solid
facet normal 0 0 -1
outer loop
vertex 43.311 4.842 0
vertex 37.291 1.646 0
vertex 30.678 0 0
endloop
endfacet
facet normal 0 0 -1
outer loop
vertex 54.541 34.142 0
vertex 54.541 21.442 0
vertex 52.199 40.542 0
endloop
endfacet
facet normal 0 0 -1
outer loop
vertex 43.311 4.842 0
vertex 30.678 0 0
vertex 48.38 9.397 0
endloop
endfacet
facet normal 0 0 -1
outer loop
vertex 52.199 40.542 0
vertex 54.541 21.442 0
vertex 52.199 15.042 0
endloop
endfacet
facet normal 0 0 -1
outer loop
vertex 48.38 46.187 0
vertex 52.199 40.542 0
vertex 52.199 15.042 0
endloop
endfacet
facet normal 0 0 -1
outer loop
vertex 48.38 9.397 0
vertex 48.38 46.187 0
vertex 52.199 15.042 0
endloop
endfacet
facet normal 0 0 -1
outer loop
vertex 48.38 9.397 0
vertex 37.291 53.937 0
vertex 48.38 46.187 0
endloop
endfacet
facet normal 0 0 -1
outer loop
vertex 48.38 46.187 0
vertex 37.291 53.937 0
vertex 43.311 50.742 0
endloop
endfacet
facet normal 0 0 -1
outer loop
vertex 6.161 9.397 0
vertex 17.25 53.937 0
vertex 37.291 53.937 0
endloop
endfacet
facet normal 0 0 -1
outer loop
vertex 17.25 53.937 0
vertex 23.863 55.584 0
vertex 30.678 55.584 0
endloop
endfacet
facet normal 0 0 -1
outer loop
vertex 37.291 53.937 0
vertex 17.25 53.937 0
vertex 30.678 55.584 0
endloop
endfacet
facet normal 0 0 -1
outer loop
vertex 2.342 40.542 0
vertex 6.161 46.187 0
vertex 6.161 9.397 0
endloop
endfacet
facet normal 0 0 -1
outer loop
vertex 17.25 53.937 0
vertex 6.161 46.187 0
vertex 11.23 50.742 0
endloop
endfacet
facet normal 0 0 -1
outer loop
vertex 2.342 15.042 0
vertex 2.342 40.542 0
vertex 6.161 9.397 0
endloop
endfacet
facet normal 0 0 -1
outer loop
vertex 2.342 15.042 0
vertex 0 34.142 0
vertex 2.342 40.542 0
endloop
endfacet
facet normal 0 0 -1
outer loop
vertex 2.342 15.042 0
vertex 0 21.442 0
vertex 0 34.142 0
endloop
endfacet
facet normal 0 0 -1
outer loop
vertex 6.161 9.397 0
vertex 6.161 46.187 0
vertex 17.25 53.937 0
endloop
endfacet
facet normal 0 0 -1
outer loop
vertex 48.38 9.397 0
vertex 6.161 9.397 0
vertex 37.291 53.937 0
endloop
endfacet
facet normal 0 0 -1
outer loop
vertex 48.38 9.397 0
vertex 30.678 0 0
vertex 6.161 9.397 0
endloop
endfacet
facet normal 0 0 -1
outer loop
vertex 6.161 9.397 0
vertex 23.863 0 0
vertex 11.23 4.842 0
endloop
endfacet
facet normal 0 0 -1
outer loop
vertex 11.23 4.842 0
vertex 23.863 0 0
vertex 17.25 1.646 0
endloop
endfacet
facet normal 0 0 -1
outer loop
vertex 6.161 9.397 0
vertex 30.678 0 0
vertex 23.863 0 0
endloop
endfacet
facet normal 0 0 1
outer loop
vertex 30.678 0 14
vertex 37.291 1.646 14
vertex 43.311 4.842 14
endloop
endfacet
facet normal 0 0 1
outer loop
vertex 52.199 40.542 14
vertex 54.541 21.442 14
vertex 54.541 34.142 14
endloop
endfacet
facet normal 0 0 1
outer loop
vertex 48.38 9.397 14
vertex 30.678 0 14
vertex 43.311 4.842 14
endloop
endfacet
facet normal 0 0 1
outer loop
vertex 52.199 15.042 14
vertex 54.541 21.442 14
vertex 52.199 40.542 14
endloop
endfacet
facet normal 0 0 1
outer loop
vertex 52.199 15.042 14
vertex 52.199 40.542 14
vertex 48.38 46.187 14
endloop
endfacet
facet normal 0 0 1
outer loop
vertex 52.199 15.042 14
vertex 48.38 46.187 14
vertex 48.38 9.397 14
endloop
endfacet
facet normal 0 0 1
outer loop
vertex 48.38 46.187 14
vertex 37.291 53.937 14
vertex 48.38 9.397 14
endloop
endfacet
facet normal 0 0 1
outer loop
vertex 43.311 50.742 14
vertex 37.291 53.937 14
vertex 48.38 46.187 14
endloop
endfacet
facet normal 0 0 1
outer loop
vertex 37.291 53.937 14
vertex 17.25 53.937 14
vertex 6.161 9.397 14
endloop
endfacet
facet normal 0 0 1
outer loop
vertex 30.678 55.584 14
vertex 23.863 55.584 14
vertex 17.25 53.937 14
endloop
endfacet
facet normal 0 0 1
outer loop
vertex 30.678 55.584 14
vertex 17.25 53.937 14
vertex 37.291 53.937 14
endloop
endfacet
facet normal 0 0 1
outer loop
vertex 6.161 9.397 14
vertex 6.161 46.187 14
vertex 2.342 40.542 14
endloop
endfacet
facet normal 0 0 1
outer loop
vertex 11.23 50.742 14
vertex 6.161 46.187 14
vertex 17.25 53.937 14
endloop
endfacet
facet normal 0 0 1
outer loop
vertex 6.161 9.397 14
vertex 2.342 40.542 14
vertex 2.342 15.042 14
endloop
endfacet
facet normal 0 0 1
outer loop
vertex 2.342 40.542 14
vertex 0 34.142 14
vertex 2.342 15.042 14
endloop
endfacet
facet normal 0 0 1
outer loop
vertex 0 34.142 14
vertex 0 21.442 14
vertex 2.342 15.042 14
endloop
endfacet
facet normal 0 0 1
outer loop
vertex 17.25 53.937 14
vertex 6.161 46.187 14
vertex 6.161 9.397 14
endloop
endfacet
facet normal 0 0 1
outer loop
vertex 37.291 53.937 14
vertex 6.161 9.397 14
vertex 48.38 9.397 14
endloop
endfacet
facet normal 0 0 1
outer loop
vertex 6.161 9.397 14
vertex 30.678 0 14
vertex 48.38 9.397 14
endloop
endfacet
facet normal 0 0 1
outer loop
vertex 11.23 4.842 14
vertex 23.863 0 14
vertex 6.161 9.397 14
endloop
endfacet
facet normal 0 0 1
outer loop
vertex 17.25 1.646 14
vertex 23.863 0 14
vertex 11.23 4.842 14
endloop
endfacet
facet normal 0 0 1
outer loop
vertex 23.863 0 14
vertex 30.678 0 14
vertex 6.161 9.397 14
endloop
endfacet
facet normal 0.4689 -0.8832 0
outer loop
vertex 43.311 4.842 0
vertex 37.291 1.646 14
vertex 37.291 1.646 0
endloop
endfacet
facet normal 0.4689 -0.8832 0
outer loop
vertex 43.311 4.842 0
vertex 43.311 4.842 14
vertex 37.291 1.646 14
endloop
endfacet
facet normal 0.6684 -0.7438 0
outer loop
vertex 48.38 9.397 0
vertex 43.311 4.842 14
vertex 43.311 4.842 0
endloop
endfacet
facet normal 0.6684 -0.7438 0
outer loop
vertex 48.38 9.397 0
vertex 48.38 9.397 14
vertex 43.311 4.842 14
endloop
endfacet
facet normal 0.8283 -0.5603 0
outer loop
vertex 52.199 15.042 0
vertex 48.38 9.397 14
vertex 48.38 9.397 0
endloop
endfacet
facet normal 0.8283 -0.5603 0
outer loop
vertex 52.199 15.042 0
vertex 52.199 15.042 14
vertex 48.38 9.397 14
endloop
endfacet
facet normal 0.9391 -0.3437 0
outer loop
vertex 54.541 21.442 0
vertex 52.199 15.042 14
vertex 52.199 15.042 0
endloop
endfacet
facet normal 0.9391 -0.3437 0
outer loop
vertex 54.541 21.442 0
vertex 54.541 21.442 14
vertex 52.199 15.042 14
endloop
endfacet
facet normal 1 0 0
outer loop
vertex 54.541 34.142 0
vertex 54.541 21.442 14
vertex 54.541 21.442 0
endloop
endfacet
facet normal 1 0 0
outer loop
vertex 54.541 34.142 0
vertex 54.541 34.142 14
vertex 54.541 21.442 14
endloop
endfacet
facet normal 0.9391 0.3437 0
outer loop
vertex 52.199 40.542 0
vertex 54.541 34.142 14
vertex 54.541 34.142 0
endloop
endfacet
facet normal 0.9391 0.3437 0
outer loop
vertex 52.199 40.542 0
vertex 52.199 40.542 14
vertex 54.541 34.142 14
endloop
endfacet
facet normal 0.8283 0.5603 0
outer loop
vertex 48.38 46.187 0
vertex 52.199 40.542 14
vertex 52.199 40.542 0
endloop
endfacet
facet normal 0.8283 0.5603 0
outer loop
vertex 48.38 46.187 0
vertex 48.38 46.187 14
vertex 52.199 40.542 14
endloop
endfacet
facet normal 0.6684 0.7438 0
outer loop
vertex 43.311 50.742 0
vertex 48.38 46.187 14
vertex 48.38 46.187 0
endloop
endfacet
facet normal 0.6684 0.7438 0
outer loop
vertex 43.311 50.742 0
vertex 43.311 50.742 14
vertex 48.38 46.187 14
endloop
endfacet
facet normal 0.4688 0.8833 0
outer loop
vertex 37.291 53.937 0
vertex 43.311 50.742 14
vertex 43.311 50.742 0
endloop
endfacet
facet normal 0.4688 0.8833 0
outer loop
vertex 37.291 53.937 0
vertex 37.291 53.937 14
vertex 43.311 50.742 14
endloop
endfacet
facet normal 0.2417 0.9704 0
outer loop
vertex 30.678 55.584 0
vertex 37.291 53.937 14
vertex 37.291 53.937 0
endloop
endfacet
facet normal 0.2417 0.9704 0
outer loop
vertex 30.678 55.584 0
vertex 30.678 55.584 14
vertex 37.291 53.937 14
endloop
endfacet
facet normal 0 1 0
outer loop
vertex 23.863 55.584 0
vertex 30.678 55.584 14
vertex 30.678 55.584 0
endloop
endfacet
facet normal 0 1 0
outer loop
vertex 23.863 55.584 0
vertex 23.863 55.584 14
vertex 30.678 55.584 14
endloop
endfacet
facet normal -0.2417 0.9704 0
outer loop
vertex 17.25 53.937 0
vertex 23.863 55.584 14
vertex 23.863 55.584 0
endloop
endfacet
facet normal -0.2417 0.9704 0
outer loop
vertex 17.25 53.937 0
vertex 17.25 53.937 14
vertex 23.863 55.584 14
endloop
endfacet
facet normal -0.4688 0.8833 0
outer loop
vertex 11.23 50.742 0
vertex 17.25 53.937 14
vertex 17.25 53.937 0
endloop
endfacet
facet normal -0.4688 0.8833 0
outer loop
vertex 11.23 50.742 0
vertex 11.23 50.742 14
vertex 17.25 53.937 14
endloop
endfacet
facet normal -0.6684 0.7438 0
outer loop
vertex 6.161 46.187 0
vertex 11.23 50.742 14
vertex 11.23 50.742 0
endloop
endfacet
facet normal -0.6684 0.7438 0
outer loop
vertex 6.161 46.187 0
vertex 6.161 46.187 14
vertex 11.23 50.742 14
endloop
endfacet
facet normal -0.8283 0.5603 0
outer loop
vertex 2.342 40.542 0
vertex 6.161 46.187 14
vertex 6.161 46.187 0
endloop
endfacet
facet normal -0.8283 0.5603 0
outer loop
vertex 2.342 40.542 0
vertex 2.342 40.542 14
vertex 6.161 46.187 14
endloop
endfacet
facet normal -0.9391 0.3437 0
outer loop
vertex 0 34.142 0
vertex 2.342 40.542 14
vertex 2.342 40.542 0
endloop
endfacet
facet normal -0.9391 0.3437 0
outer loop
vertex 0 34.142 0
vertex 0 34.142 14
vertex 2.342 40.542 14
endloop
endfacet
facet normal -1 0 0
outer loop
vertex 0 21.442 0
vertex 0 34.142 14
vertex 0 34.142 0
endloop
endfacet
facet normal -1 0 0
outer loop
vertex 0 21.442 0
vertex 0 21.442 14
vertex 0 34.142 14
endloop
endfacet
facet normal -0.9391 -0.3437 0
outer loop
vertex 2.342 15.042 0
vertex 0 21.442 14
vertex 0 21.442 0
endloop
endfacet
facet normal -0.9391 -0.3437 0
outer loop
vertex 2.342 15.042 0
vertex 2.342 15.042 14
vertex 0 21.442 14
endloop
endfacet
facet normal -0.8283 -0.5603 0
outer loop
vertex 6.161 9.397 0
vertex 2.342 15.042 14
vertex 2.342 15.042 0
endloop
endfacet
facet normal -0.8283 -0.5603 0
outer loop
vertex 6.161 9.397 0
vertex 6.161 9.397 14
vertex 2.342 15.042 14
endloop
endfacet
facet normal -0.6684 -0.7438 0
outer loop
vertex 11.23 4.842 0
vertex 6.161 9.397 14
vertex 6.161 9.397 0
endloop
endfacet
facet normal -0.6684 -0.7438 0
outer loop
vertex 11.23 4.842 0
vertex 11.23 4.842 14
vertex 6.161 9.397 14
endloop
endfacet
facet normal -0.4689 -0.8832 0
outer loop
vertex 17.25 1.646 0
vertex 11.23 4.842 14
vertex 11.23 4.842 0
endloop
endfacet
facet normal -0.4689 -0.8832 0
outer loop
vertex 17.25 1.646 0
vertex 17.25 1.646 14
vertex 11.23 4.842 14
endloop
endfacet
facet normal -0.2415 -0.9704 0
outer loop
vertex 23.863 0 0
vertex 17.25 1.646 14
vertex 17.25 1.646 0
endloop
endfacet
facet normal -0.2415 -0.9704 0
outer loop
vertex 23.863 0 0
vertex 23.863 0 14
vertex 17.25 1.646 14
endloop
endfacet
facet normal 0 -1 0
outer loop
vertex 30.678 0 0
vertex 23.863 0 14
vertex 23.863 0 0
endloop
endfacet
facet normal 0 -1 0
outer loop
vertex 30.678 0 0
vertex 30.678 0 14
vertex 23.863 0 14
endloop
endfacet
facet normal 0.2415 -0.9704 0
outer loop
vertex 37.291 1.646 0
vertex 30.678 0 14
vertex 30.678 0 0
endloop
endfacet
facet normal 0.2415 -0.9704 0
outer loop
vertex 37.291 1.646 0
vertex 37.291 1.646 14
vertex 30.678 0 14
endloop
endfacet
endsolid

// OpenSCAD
$fn = 32;

// ----------------------------------------------------------------------
// Flat adaptor: double_d, 14 mm thick
// ----------------------------------------------------------------------

// --- parameters (mm) ---
profile_height = 14;      // extrusion height
profile_points = 24;      // points of the closed outline

profile = [[54.541, 34.142], [52.199, 40.542], [48.38, 46.187], [43.311, 50.742], [37.291, 53.937], [30.678, 55.584], [23.863, 55.584], [17.25, 53.937], [11.23, 50.742], [6.161, 46.187], [2.342, 40.542], [0, 34.142], [0, 21.442], [2.342, 15.042], [6.161, 9.397], [11.23, 4.842], [17.25, 1.646], [23.863, 0], [30.678, 0], [37.291, 1.646], [43.311, 4.842], [48.38, 9.397], [52.199, 15.042], [54.541, 21.442]];  // single closed polygon, 24 points, counter clockwise

// --- the one profile operation ---
linear_extrude(height = profile_height) polygon(points = profile);
